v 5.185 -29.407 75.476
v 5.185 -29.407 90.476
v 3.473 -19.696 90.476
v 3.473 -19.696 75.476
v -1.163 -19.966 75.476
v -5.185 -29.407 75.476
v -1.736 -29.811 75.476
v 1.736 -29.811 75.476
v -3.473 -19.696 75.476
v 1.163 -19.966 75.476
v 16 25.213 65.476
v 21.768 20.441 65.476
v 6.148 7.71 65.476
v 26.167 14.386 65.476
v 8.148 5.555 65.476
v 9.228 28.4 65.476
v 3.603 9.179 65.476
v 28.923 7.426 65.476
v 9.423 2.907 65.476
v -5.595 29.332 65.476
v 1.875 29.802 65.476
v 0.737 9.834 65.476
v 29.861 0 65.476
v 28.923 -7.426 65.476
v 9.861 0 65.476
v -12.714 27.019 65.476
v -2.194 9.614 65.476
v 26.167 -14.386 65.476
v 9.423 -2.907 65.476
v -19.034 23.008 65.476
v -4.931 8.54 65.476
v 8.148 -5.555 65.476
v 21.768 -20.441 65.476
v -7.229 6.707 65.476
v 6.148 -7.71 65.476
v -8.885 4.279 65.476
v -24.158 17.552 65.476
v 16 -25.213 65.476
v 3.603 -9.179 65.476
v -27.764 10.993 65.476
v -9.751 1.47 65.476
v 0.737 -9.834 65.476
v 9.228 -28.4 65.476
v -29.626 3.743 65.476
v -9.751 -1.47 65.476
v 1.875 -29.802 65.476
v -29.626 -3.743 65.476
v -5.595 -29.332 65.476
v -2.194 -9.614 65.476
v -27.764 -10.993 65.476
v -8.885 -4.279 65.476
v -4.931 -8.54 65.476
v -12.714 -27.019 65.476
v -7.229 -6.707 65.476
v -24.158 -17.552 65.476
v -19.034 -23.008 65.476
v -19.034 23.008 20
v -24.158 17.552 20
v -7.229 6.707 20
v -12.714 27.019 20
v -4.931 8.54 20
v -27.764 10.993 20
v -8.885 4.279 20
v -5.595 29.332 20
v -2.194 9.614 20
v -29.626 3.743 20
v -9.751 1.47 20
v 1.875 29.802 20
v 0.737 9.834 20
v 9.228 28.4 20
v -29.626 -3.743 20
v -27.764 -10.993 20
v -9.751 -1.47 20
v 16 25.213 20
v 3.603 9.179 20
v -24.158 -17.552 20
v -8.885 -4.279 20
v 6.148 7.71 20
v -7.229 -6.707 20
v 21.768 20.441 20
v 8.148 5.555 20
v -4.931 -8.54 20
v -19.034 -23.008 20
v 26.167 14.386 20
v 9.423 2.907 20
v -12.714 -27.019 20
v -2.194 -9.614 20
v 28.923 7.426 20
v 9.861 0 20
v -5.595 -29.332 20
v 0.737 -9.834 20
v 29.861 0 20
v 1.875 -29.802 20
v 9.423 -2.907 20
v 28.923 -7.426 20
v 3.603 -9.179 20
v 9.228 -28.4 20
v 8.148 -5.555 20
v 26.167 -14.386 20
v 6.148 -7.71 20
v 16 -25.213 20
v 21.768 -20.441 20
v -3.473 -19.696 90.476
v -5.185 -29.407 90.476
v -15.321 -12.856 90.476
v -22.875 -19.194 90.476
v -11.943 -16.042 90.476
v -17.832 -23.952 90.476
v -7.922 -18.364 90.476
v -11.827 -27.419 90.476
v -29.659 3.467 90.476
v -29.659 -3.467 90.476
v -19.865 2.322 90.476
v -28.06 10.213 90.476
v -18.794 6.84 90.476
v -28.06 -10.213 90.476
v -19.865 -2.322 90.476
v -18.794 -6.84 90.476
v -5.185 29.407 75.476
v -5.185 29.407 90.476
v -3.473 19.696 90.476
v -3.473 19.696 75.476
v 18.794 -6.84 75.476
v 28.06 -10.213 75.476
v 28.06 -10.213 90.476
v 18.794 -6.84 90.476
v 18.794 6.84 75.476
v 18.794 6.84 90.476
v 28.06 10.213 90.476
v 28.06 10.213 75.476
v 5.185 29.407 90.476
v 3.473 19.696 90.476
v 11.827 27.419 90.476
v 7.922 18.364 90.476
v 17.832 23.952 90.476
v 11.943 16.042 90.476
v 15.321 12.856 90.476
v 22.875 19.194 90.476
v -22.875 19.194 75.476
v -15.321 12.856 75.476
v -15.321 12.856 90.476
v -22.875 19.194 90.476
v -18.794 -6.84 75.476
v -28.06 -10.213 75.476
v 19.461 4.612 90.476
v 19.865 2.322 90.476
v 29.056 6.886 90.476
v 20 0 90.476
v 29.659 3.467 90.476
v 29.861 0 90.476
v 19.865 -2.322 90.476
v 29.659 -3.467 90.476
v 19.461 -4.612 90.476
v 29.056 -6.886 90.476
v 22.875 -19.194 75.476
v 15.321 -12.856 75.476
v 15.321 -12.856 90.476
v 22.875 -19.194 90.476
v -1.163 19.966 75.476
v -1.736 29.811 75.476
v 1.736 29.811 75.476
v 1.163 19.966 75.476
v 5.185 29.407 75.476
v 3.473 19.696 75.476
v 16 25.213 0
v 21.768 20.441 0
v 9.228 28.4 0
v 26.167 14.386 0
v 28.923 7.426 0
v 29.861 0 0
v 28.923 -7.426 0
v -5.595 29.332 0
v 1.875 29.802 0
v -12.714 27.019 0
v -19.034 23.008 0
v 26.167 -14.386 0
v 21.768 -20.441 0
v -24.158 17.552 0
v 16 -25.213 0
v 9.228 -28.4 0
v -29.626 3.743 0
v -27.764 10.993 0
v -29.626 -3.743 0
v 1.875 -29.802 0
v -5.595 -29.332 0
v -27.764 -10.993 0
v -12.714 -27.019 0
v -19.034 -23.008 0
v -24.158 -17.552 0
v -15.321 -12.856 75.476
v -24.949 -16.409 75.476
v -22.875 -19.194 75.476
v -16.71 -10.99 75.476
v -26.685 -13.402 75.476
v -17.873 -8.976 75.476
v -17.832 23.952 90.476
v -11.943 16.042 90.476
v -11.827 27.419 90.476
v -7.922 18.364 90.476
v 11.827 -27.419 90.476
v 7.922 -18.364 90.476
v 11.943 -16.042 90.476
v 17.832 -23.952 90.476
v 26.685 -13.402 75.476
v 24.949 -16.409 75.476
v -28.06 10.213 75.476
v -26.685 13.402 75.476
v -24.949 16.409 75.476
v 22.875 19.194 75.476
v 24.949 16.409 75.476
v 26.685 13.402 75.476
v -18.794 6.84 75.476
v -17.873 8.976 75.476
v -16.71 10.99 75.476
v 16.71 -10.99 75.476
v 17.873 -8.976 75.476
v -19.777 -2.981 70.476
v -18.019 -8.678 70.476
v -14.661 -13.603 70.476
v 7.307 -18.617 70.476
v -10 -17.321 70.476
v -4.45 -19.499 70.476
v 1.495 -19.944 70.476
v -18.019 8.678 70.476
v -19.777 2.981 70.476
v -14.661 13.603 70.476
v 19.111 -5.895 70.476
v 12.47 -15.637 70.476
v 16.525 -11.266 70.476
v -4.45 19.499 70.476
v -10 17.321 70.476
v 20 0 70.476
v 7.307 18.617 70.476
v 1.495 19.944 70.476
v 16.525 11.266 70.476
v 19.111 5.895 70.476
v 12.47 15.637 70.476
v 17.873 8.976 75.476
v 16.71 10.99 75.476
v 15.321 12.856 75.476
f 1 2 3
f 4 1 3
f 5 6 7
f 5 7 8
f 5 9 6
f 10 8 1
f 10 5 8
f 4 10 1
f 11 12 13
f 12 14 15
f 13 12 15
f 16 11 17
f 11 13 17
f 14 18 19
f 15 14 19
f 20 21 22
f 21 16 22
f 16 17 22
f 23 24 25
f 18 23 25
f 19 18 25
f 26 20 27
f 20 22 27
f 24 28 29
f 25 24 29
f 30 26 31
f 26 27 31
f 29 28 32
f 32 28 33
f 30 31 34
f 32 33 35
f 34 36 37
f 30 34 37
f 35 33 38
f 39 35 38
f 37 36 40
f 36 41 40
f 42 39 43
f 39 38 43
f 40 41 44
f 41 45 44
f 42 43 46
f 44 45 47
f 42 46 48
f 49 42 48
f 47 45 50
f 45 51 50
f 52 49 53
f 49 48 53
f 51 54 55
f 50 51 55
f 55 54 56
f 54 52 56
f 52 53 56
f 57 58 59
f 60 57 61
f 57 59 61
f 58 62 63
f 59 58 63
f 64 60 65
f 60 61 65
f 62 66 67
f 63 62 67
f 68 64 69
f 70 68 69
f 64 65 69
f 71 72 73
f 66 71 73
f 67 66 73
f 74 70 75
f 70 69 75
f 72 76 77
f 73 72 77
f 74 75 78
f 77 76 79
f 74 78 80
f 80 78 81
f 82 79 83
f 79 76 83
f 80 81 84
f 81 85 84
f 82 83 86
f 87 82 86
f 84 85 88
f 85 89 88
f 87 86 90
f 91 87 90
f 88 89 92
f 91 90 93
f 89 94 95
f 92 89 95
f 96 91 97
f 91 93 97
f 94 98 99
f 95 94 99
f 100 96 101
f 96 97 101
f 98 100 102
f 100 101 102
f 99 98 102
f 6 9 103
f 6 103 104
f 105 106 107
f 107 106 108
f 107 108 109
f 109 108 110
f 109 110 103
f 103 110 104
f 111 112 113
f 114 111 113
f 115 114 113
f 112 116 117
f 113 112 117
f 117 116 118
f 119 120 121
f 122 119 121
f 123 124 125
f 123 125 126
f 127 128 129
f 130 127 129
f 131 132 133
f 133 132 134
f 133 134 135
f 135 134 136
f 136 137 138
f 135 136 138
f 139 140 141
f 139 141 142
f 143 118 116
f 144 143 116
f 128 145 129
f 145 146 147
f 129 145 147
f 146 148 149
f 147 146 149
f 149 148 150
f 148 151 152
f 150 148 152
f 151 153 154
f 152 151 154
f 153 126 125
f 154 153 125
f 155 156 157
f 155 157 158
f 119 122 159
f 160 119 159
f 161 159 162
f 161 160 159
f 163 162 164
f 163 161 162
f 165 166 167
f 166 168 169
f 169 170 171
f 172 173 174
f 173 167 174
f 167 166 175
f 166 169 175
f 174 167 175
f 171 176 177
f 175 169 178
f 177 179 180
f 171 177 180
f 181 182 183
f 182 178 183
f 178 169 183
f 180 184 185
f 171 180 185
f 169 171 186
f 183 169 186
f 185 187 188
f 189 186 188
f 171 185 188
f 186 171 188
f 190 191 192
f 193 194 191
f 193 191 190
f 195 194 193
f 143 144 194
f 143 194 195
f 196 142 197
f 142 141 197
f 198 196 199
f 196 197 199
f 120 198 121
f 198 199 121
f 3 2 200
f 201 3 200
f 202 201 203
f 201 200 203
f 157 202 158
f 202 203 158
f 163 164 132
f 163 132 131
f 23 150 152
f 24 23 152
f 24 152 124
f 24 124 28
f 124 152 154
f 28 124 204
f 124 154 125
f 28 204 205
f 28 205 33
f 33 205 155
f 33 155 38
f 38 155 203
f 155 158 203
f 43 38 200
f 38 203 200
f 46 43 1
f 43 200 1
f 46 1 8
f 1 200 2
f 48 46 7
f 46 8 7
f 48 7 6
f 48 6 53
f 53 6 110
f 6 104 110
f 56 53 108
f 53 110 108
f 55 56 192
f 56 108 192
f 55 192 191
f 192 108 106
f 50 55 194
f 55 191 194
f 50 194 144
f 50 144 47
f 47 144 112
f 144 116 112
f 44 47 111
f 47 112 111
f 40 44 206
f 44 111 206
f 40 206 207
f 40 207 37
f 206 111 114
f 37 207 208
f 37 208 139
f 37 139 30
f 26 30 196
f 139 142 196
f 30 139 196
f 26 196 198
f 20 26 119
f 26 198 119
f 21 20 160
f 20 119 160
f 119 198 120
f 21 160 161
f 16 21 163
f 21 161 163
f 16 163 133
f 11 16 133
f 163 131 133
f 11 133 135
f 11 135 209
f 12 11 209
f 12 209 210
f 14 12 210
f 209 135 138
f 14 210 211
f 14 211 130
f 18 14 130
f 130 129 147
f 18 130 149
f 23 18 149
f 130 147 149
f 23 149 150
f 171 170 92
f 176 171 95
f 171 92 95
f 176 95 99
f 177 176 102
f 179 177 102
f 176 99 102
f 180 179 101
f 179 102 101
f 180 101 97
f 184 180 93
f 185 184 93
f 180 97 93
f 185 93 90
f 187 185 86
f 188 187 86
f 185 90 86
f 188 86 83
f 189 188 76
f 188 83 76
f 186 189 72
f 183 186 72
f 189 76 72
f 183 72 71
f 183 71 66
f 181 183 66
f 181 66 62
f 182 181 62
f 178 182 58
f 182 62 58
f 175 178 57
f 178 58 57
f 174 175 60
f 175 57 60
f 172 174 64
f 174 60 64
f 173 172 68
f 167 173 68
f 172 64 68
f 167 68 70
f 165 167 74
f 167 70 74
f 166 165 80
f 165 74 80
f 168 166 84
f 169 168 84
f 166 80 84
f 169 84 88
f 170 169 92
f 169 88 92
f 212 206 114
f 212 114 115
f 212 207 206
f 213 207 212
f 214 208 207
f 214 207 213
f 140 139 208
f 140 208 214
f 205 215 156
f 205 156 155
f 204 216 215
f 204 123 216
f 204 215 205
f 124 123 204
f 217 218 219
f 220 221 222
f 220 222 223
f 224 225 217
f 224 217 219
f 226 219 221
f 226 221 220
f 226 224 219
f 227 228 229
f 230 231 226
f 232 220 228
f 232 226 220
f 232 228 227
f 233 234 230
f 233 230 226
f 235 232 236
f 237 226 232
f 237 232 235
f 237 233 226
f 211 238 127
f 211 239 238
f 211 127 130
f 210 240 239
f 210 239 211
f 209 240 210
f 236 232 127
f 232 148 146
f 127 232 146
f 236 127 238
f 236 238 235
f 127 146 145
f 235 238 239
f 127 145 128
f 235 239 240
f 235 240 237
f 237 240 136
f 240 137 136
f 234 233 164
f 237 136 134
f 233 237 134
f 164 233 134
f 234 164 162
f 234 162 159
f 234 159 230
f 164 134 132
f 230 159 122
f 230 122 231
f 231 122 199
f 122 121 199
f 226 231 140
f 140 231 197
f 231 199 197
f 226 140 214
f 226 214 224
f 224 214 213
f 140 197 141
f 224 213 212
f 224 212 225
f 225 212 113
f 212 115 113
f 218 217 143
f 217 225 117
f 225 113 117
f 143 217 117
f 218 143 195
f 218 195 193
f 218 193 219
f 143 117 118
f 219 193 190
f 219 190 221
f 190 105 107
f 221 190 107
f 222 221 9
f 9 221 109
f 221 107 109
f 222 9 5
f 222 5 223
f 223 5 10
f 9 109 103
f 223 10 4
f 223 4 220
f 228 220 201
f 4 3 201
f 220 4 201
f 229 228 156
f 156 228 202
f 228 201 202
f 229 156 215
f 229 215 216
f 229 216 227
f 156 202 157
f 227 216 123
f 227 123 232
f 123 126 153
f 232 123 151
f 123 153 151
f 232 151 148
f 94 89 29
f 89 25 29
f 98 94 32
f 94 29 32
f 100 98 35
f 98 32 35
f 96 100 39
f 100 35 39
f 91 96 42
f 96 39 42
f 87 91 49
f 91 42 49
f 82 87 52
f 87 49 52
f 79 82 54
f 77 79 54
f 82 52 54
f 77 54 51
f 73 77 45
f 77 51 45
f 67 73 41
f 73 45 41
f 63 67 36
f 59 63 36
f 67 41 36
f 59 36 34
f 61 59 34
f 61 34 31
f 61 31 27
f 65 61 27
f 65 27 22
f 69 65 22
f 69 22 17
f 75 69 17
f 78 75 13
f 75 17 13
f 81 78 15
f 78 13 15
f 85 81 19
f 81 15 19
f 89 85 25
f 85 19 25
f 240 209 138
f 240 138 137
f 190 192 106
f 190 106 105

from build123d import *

# Parameters (mm, degrees)
F2_R     = 20
F3_DEPTH = 20
F5_DEPTH = 15


with BuildPart() as f1:
    # F0 (on Front) → F1 (revolve)
    with BuildSketch(Plane.XZ):
        Polygon((29.861114, 20), (9.861114, 20), (9.861114, 65.476191), (29.861114, 65.476191), (29.861114, 90.476191), (0, 90.476191), (0, 0), (29.861114, 0), align=None)
    revolve(axis=Axis((0, 0, 45.238095), (0, 0, -1)))

    # F2 (on face) → F3 (cut)
    with BuildSketch(Plane.XY.offset(90.476191)):
        Circle(F2_R)
    extrude(amount=-F3_DEPTH, mode=Mode.SUBTRACT)

    # F4 (on face) → F5 (cut)
    with BuildSketch(Plane.XY.offset(90.476191)):
        with BuildLine():
            ThreePointArc((-3.013717, 17.091636), (0, 17.355302), (3.013717, 17.091636))
            Line((3.013717, 17.091636), (6.241417, 35.396835))
            ThreePointArc((6.241417, 35.396835), (0, 35.942888), (-6.241417, 35.396835))
            Line((-6.241417, 35.396835), (-3.013717, 17.091636))
        make_face()
        with BuildLine():
            Line((-33.775267, 12.293192), (-16.308649, 5.935863))
            ThreePointArc((-16.308649, 5.935863), (-15.030132, 8.677651), (-13.294933, 11.155773))
            Line((-13.294933, 11.155773), (-27.53385, 23.103643))
            ThreePointArc((-27.53385, 23.103643), (-31.127454, 17.971444), (-33.775267, 12.293192))
        make_face()
        with BuildLine():
            Line((-27.53385, -23.103643), (-13.294933, -11.155773))
            ThreePointArc((-13.294933, -11.155773), (-15.030132, -8.677651), (-16.308649, -5.935863))
            Line((-16.308649, -5.935863), (-33.775267, -12.293192))
            ThreePointArc((-33.775267, -12.293192), (-31.127454, -17.971444), (-27.53385, -23.103643))
        make_face()
        with BuildLine():
            Line((6.241417, -35.396835), (3.013717, -17.091636))
            ThreePointArc((3.013717, -17.091636), (0, -17.355302), (-3.013717, -17.091636))
            Line((-3.013717, -17.091636), (-6.241417, -35.396835))
            ThreePointArc((-6.241417, -35.396835), (0, -35.942888), (6.241417, -35.396835))
        make_face()
        with BuildLine():
            Line((33.775267, -12.293192), (16.308649, -5.935863))
            ThreePointArc((16.308649, -5.935863), (15.030132, -8.677651), (13.294933, -11.155773))
            Line((13.294933, -11.155773), (27.53385, -23.103643))
            ThreePointArc((27.53385, -23.103643), (31.127454, -17.971444), (33.775267, -12.293192))
        make_face()
        with BuildLine():
            Line((27.53385, 23.103643), (13.294933, 11.155773))
            ThreePointArc((13.294933, 11.155773), (15.030132, 8.677651), (16.308649, 5.935863))
            Line((16.308649, 5.935863), (33.775267, 12.293192))
            ThreePointArc((33.775267, 12.293192), (31.127454, 17.971444), (27.53385, 23.103643))
        make_face()
    extrude(amount=-F5_DEPTH, mode=Mode.SUBTRACT)


solid = f1.part
